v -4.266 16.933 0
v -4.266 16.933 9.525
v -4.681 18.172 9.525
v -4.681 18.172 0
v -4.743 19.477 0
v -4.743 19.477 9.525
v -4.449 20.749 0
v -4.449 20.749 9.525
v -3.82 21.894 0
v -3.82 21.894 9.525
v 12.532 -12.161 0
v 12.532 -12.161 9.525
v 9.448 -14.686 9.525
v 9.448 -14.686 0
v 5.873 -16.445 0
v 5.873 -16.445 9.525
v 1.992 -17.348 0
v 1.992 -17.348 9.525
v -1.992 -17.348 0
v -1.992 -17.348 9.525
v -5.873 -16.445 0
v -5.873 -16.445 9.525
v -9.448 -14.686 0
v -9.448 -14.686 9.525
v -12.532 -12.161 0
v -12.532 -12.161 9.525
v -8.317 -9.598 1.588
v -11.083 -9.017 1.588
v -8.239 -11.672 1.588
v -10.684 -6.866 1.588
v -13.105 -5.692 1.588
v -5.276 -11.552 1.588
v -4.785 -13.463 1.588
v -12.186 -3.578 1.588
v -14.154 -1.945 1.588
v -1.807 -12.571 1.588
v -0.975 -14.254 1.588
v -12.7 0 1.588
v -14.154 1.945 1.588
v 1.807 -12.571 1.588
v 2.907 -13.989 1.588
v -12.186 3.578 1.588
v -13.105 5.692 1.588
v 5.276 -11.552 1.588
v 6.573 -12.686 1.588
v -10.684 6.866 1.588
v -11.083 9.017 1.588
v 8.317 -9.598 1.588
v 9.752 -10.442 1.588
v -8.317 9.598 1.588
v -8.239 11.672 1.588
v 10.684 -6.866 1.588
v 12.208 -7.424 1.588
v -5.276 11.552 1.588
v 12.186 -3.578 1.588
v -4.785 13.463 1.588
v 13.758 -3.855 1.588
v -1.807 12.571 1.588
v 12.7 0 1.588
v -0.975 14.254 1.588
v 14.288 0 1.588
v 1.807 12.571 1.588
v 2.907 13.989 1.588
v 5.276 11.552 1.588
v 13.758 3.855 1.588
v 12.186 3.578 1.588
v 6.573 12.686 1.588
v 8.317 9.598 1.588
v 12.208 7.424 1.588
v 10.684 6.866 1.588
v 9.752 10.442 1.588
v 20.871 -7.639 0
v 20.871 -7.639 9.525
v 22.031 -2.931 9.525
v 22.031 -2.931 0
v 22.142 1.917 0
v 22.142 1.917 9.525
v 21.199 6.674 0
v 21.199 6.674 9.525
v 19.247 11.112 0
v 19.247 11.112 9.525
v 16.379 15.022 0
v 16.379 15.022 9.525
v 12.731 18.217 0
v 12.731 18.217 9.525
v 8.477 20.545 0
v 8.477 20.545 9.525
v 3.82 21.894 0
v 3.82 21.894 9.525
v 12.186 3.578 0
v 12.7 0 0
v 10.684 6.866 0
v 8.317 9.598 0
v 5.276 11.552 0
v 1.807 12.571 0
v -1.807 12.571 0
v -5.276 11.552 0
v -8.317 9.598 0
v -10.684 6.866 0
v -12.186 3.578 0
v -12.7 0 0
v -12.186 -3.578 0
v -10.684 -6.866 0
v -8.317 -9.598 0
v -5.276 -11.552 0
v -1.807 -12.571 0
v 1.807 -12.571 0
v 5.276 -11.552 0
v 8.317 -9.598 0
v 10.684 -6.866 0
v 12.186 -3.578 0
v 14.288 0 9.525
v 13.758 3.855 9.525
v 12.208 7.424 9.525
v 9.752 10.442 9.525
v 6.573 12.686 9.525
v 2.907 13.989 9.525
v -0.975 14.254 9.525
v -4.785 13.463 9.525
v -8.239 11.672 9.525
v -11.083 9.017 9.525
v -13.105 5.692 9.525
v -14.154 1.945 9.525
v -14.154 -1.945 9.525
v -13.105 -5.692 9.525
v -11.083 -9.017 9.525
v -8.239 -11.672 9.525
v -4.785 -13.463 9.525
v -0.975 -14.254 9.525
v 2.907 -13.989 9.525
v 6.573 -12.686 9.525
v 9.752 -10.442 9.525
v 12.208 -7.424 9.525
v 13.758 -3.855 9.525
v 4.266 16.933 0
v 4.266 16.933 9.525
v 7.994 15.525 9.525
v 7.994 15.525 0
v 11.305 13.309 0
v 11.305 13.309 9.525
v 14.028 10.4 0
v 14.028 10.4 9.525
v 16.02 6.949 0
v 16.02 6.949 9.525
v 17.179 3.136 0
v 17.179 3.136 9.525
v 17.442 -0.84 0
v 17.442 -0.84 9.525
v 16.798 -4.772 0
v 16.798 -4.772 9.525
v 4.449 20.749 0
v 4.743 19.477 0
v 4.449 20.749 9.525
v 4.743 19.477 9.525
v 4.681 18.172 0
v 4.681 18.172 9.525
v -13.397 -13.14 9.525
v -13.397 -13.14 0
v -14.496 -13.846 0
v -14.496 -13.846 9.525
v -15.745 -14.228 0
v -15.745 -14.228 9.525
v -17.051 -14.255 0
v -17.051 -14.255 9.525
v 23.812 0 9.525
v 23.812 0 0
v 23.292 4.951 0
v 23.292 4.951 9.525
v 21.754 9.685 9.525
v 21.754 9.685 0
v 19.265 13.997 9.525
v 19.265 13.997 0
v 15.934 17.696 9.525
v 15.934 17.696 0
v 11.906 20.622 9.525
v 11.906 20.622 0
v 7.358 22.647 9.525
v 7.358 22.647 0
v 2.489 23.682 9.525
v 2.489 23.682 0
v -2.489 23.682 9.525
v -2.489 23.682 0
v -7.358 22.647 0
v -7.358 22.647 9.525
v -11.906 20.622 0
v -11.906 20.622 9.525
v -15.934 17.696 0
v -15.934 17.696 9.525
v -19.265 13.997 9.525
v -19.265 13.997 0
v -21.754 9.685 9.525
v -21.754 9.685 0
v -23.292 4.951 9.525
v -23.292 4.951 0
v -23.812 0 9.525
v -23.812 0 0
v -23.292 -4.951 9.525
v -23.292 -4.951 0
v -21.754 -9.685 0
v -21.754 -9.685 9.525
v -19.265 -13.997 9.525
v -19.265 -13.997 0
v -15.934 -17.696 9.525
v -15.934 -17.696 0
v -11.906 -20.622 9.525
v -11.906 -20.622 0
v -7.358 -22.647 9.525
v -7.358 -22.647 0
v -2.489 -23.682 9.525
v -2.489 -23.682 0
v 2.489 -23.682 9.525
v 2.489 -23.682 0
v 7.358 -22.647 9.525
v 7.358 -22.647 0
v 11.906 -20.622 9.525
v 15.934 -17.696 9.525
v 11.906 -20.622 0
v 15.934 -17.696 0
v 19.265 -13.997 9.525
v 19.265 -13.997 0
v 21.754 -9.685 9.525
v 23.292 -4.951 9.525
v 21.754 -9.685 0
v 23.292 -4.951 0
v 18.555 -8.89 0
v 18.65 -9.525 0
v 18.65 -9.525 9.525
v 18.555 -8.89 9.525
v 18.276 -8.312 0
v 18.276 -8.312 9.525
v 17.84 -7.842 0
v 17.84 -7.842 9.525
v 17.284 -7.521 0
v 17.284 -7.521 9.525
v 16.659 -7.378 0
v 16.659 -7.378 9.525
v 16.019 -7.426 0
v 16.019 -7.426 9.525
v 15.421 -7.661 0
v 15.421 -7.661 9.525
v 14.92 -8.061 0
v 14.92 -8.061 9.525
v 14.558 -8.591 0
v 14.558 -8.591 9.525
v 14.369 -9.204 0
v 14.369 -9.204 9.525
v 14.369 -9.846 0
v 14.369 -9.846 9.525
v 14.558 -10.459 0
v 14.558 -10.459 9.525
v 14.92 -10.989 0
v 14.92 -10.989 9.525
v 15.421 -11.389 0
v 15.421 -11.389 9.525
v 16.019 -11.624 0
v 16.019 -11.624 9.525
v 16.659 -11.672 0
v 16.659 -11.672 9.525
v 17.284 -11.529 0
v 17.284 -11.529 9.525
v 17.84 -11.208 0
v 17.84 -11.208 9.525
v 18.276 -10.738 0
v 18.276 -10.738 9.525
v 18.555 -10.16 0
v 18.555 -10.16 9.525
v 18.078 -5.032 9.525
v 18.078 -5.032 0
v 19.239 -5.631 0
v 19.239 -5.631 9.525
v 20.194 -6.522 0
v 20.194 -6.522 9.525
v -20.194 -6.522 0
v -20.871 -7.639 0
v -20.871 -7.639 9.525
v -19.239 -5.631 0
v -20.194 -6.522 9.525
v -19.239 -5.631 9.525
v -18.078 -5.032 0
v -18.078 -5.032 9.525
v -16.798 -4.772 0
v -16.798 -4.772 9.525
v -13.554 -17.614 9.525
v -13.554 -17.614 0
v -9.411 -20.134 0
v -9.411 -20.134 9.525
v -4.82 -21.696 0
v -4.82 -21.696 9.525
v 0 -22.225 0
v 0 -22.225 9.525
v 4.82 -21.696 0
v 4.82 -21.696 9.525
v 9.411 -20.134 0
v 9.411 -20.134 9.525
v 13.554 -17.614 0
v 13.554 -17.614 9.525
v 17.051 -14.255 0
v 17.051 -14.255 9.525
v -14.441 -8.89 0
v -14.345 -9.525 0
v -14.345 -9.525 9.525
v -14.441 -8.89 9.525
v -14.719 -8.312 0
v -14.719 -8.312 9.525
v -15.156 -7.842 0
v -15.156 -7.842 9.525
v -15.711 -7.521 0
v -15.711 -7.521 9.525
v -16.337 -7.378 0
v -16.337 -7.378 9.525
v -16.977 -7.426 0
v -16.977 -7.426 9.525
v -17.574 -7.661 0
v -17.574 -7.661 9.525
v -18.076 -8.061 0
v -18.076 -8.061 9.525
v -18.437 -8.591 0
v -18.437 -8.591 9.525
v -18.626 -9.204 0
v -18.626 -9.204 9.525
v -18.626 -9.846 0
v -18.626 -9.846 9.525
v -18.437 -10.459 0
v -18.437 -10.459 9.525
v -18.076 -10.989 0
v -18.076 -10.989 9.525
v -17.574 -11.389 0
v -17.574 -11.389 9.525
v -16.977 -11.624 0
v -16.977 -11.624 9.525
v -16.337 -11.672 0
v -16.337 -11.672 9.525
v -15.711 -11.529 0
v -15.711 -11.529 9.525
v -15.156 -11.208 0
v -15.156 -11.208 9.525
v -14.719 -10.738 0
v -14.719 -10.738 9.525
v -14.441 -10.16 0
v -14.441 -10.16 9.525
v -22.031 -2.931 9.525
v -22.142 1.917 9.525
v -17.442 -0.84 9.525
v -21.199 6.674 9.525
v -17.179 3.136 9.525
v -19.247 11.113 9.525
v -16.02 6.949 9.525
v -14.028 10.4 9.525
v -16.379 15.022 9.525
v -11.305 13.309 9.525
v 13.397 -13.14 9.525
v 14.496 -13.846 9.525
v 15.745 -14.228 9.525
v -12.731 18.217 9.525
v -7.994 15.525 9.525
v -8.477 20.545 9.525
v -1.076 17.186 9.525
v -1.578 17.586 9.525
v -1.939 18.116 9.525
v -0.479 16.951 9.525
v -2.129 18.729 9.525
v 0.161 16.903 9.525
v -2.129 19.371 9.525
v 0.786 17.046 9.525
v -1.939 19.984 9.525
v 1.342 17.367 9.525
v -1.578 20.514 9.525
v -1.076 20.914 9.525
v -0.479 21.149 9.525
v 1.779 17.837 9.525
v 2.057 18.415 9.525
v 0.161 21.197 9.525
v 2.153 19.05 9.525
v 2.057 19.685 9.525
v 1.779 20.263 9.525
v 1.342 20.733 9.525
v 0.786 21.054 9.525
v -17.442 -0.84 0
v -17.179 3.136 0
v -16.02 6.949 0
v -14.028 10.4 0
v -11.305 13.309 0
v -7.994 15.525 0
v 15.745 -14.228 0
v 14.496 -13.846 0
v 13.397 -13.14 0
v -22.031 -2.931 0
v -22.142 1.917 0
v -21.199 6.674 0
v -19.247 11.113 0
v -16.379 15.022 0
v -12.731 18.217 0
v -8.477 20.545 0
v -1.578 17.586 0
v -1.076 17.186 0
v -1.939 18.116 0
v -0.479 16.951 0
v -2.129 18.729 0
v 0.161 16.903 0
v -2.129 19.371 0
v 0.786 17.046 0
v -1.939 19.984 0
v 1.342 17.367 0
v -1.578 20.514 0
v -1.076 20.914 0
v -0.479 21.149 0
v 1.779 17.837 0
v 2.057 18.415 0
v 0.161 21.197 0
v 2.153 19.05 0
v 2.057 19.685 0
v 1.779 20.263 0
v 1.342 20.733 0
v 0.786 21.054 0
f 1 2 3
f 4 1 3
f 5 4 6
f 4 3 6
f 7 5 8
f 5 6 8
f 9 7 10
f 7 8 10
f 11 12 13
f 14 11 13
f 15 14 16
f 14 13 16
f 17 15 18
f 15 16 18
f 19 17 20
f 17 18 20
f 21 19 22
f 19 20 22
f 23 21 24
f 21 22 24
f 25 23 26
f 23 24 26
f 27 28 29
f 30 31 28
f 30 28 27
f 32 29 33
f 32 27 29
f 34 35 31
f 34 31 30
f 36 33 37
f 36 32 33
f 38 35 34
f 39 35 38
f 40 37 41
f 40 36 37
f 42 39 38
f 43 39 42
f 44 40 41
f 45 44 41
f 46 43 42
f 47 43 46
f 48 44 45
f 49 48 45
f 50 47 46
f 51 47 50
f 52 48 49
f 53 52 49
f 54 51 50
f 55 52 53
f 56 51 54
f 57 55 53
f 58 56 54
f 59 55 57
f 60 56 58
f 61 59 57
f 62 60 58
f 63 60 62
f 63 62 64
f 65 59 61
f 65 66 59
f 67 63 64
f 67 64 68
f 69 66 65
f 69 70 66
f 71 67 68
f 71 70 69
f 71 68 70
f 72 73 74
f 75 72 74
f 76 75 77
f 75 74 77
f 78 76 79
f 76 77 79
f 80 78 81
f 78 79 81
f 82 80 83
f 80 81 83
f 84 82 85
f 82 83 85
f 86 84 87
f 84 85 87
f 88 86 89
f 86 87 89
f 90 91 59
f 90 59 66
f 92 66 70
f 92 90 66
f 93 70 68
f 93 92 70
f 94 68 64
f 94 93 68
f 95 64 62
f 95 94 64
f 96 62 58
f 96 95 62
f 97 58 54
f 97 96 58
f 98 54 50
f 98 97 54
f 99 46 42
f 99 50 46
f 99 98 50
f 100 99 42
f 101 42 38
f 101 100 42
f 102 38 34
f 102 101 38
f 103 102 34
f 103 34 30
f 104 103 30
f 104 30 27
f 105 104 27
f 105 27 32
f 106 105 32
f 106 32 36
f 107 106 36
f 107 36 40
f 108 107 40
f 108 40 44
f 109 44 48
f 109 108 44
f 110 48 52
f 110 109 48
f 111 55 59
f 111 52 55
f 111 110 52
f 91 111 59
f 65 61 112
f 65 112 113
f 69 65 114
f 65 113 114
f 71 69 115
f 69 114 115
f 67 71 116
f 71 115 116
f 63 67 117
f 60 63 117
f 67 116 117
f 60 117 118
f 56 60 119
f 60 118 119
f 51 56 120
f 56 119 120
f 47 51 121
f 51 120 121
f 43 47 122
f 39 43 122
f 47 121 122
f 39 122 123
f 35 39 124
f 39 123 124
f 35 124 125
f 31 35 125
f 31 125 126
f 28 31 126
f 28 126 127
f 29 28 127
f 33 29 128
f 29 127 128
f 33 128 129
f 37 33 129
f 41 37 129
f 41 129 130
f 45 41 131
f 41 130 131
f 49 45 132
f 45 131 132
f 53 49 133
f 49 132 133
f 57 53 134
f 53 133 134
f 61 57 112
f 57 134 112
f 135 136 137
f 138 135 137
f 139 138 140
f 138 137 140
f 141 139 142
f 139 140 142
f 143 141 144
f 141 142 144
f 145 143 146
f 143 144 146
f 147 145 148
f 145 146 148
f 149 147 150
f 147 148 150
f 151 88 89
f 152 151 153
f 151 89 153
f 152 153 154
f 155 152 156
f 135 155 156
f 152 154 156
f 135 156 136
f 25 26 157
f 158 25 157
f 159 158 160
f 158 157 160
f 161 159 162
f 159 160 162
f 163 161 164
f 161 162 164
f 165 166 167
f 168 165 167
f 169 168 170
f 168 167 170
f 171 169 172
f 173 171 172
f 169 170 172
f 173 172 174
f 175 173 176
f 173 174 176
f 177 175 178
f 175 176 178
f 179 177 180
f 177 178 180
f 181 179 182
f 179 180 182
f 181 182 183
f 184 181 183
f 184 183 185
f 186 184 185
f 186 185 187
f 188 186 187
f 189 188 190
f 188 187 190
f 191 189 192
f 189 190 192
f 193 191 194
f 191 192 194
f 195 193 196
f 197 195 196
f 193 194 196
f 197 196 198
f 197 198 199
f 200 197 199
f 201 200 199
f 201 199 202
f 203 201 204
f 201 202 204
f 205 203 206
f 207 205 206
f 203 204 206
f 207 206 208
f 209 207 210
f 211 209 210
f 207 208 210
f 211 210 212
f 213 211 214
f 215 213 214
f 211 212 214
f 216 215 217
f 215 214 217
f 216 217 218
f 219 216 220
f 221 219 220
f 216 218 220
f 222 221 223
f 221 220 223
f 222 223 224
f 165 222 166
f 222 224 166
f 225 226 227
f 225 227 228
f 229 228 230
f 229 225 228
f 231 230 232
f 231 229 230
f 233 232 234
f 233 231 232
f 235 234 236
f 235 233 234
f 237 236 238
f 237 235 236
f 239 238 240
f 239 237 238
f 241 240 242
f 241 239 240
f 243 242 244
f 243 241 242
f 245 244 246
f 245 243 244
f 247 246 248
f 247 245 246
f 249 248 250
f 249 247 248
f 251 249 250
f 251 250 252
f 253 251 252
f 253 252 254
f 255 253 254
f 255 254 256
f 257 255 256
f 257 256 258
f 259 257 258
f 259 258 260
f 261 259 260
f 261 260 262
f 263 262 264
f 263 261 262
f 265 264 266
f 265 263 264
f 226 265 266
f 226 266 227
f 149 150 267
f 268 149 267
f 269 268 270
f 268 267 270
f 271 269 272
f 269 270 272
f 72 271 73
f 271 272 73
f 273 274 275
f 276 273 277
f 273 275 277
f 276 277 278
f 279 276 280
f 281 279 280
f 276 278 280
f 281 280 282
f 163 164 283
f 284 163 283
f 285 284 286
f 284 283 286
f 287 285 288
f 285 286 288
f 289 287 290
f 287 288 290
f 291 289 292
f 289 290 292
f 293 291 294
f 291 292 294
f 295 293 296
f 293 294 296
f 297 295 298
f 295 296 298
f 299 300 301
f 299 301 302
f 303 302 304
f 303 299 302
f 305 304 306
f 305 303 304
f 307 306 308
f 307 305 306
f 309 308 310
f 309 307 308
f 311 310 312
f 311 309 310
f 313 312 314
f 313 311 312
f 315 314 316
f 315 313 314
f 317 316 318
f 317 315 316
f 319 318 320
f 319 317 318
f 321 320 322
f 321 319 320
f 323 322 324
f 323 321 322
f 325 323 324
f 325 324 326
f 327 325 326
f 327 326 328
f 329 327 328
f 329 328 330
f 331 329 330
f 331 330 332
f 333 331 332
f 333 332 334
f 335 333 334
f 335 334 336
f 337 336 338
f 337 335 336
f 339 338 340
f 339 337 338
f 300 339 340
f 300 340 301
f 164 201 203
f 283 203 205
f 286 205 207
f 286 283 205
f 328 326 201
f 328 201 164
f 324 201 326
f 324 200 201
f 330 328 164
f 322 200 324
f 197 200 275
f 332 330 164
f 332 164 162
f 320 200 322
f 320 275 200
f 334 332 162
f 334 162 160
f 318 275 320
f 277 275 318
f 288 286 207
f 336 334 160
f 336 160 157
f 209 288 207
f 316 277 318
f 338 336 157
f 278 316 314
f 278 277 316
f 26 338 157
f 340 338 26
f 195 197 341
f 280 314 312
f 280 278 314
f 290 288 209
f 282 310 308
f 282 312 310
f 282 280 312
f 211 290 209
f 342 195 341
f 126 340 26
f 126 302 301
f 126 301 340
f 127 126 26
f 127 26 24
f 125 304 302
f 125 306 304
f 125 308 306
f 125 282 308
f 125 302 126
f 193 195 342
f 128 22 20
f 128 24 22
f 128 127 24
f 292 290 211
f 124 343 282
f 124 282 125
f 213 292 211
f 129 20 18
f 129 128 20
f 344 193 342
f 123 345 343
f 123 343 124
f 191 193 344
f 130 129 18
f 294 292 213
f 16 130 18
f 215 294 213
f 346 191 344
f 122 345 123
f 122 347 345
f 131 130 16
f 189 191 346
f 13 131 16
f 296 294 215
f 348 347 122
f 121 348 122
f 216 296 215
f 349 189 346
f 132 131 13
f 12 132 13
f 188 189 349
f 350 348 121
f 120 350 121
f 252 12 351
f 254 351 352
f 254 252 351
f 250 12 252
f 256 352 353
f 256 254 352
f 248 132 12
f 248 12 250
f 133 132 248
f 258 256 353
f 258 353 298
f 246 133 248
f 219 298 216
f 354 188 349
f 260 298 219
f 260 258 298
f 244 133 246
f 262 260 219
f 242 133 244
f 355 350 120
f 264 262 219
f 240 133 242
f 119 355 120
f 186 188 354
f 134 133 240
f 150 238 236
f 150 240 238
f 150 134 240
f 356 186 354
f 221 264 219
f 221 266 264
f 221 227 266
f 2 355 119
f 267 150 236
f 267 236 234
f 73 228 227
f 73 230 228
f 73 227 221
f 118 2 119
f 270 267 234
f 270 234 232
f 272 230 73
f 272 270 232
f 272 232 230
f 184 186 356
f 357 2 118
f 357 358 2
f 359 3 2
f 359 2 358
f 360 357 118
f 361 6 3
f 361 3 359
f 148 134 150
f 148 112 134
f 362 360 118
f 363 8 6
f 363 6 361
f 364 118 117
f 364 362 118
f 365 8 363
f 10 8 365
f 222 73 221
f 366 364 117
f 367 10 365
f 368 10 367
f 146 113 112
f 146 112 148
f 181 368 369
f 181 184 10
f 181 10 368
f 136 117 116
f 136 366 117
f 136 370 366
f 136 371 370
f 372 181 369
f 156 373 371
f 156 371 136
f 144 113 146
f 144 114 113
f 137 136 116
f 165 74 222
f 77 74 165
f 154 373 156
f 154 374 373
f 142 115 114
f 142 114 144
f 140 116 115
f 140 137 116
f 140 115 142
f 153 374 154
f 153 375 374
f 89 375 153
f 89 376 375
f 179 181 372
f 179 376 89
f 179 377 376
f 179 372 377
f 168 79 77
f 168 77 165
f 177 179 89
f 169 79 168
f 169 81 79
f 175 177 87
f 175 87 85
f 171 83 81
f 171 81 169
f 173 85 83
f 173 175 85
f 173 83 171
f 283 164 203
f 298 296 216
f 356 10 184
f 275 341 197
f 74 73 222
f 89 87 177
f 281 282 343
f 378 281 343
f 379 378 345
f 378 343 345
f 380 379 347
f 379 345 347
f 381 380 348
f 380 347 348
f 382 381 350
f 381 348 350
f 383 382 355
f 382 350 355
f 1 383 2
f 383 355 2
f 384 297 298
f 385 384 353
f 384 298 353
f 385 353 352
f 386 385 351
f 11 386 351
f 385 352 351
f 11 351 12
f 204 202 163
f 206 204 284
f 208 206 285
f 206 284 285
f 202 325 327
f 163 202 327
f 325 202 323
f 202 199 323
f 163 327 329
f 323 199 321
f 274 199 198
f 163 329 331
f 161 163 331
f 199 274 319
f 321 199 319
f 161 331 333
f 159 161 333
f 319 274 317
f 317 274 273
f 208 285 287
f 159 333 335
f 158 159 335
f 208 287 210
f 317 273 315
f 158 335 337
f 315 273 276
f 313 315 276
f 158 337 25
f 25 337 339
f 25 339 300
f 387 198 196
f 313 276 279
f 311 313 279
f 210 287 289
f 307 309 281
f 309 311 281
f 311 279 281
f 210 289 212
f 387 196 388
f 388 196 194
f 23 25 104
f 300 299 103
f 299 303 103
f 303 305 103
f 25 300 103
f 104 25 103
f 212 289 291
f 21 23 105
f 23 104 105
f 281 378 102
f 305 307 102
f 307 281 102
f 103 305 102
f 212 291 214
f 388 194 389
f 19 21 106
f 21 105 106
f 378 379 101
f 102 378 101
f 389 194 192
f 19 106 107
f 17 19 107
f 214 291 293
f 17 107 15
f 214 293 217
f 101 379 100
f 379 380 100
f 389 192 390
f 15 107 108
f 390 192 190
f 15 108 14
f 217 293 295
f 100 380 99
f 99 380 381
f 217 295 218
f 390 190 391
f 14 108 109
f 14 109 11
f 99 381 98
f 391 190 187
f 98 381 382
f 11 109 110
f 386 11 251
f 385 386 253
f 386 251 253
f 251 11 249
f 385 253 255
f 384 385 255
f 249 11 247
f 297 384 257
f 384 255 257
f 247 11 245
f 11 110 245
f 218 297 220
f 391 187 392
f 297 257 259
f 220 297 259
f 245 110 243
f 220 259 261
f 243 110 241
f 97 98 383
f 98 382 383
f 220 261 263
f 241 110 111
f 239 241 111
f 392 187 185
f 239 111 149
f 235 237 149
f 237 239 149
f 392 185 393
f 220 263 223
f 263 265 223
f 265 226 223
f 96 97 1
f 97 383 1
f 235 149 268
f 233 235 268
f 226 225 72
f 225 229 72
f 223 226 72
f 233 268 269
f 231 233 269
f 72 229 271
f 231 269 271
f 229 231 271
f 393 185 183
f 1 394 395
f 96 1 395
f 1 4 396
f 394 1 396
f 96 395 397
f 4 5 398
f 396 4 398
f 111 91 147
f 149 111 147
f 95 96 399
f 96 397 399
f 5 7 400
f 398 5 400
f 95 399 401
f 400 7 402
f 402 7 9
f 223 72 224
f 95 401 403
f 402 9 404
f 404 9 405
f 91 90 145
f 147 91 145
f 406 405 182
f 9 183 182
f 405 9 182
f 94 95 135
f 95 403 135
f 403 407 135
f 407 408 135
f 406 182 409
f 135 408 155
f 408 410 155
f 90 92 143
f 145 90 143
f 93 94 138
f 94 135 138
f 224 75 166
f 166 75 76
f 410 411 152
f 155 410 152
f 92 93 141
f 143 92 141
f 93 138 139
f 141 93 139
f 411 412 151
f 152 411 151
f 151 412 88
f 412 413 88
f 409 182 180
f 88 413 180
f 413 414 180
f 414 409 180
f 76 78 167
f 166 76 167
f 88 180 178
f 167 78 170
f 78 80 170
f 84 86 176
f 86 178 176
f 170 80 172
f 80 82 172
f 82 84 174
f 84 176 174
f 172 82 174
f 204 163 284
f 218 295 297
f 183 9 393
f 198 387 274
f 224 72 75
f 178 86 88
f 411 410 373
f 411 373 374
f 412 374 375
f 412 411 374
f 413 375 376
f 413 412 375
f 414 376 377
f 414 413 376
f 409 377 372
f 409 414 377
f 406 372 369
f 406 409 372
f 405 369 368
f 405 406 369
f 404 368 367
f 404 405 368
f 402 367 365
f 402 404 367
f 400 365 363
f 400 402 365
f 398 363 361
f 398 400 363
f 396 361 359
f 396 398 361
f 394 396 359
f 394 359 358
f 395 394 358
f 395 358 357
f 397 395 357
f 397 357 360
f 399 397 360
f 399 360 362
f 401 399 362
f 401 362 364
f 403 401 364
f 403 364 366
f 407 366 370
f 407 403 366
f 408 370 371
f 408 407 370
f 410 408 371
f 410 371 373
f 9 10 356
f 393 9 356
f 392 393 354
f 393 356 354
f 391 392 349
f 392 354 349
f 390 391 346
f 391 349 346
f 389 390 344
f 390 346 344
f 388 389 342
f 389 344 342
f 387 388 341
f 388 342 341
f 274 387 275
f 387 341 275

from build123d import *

# Parameters (mm, degrees)
F0_R            = 23.8125
F0_R_2          = 2.15265
F0_R_3          = 12.7
F1_DEPTH        = 9.525
F2_R            = 14.2875
F3_DEPTH        = 7.9375
F5_DEPTH        = 9.525
F5_COPIES_COUNT = 3


# Not quite as in the source:
# - a pattern or mirror of a feature is missing from the dataset's text; its kind, count and spacing are read off the source's solid


with BuildPart() as f1:
    # F0 (on Top) → F1 (new body)
    with BuildSketch(Plane.XY):
        Circle(F0_R)
        with Locations((-16.4977839421, -9.525)):
            Circle(F0_R_2, mode=Mode.SUBTRACT)
        with Locations((16.4977839421, -9.525)):
            Circle(F0_R_2, mode=Mode.SUBTRACT)
        Circle(F0_R_3, mode=Mode.SUBTRACT)
        with Locations((0, 19.05)):
            Circle(F0_R_2, mode=Mode.SUBTRACT)
    extrude(amount=F1_DEPTH)

    # F2 (on face) → F3 (cut)
    with BuildSketch(Plane.XY.offset(9.525)):
        Circle(F2_R)
    extrude(amount=-F3_DEPTH, mode=Mode.SUBTRACT)

    # F4 (on face) → F5 (cut, through all)
    with BuildSketch(Plane.XY.offset(9.525)):
        with BuildLine():
            ThreePointArc((17.0510516982, -14.2552538029), (14.4957458217, -13.8462555599), (12.5315578082, -12.1613718449))
            ThreePointArc((12.5315578082, -12.1613718449), (0, -17.4625), (-12.5315578082, -12.1613718449))
            ThreePointArc((-12.5315578082, -12.1613718449), (-14.4957458217, -13.8462555599), (-17.0510516982, -14.2552538029))
            ThreePointArc((-17.0510516982, -14.2552538029), (0, -22.225), (17.0510516982, -14.2552538029))
        make_face()
    f5 = extrude(amount=-F5_DEPTH, mode=Mode.SUBTRACT)

    # F5_copies: F5 ×3 about axis
    f5_copies_axis = Axis((0, 0, 0), (0, 0, 1))
    for i in range(1, F5_COPIES_COUNT):
        add(f5.rotate(f5_copies_axis, i * 360 / F5_COPIES_COUNT), mode=Mode.SUBTRACT)


solid = f1.part
